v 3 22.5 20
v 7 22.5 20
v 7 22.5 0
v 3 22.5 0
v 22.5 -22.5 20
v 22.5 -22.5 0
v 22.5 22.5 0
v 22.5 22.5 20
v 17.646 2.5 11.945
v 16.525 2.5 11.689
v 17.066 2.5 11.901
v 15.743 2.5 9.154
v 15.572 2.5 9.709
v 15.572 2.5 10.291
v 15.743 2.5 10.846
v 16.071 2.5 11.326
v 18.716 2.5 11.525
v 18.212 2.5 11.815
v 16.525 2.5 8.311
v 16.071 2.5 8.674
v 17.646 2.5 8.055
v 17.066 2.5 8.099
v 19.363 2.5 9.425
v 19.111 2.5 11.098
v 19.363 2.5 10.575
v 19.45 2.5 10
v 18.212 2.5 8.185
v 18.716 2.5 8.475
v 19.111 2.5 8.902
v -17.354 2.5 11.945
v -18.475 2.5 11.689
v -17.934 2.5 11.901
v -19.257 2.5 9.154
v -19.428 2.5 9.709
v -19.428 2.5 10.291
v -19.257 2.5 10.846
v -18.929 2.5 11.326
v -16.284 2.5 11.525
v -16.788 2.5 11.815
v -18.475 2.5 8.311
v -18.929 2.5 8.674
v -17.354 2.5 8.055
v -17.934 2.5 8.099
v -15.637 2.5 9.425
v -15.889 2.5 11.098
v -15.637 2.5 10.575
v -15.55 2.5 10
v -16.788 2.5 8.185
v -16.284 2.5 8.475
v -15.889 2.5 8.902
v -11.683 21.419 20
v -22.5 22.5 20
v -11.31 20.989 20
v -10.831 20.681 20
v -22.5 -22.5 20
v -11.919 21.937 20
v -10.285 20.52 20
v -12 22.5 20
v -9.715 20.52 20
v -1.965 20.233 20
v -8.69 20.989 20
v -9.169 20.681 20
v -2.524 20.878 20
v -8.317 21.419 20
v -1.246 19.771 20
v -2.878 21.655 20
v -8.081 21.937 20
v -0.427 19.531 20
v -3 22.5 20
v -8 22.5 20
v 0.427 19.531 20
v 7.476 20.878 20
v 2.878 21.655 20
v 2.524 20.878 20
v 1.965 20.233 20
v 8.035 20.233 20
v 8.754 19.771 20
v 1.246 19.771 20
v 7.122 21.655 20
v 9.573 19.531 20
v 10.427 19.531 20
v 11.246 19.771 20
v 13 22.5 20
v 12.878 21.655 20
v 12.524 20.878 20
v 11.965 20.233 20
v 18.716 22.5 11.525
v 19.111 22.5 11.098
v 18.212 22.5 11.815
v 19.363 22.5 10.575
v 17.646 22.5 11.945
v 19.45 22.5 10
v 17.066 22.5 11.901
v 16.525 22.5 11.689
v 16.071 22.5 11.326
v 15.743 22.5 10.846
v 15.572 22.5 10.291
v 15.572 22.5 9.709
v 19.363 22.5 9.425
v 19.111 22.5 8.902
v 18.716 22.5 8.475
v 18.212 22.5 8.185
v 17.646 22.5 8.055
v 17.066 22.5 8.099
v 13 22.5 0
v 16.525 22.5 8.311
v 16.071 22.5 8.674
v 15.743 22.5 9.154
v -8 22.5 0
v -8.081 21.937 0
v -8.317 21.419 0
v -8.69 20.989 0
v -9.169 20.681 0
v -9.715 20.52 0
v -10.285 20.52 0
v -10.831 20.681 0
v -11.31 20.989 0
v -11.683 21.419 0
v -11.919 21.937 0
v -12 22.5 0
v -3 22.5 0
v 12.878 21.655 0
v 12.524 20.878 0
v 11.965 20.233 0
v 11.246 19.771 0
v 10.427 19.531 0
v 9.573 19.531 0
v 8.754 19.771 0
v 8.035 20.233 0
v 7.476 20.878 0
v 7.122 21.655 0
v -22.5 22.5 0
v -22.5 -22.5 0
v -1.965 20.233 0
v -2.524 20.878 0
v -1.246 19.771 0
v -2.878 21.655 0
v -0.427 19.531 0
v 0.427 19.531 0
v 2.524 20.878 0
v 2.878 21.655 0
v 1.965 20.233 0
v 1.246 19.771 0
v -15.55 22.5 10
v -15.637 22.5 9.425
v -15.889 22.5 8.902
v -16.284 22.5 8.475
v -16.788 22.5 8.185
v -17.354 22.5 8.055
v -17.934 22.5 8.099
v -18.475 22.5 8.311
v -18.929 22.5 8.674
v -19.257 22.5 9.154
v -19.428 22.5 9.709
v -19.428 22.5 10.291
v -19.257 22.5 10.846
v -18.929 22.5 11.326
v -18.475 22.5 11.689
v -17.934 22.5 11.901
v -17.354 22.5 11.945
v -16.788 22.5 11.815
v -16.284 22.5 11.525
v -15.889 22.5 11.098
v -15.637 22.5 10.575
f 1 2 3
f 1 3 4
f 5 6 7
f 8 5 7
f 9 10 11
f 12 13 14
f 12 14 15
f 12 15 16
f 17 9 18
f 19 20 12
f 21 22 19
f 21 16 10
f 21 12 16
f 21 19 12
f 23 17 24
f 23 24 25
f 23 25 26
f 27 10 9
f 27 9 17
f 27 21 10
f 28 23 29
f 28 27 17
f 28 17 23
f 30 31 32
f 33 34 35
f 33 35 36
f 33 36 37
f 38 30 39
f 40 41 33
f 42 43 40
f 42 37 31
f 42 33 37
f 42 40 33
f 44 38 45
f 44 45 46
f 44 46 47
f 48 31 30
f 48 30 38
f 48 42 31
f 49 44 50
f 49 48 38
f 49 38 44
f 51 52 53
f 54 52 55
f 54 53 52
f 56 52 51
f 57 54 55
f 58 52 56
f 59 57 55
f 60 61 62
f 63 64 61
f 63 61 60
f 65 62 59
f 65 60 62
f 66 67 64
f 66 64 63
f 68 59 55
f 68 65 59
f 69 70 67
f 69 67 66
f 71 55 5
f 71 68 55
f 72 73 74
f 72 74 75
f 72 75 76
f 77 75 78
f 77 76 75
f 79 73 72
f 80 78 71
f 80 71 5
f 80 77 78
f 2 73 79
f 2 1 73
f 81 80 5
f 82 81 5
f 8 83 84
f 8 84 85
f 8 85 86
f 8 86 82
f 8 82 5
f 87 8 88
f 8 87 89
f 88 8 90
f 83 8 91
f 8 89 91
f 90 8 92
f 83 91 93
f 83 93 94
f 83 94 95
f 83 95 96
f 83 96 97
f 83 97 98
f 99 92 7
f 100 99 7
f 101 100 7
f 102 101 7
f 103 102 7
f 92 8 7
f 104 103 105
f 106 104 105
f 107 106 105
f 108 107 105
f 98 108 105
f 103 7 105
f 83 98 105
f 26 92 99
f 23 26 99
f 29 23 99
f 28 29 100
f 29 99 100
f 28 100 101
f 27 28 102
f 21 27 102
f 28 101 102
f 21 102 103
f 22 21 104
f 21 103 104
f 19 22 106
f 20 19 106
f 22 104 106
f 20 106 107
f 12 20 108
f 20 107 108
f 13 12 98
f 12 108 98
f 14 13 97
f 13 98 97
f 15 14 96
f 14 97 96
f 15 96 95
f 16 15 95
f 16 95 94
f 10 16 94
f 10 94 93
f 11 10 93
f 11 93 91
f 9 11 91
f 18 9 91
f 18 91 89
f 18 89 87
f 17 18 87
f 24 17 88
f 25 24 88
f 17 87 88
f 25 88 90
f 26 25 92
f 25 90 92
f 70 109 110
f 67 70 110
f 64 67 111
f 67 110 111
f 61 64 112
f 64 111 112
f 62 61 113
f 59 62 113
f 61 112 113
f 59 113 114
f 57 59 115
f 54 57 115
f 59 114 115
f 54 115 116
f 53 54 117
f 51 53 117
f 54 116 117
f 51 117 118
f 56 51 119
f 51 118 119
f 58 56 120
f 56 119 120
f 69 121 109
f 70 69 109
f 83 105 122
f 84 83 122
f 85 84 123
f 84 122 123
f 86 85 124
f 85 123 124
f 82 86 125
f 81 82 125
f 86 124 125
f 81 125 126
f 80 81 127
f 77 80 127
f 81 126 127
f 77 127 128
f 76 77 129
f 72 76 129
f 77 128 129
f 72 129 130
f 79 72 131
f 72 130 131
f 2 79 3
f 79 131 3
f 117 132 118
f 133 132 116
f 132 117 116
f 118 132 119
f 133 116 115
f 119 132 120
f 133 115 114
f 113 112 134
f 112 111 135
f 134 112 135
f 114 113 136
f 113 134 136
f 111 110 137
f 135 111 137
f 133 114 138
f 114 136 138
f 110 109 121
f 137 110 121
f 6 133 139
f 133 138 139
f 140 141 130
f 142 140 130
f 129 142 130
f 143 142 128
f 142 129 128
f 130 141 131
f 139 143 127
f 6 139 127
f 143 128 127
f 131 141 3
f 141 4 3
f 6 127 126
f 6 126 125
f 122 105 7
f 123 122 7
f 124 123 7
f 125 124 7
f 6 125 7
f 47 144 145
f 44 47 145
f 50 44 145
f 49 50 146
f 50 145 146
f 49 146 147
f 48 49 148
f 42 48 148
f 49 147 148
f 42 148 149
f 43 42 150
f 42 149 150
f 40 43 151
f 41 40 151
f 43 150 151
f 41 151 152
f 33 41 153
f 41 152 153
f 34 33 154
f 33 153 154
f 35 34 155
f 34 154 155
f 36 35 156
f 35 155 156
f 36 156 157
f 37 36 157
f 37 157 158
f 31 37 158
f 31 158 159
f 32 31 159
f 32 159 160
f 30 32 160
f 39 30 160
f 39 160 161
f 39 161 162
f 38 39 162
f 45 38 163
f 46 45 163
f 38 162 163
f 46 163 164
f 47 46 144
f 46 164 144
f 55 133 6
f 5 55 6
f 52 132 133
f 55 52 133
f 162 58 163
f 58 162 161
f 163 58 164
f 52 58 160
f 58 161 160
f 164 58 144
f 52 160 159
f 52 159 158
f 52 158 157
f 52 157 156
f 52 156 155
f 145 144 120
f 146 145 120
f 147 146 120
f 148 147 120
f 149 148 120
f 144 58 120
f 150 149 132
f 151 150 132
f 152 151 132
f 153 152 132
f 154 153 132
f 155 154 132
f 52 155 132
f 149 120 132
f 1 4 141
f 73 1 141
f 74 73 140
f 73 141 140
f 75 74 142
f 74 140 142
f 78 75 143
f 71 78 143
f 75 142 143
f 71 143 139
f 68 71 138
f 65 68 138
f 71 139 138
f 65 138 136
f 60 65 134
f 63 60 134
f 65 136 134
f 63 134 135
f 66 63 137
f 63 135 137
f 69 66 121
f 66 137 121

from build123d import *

# Parameters (mm, degrees)
BOSS_EXTRUDE1_DEPTH = 20
SKETCH2_R           = 1.95
CUT_EXTRUDE1_DEPTH  = 20


with BuildPart() as part:
    # Sketch1 → Boss-Extrude1 (new body)
    with BuildSketch(Plane.XY):
        with BuildLine():
            Line((-22.5, -22.5), (22.5, -22.5))
            Line((22.5, -22.5), (22.5, 22.5))
            Line((22.5, 22.5), (13, 22.5))
            ThreePointArc((13, 22.5), (10, 19.5), (7, 22.5))
            Line((7, 22.5), (3, 22.5))
            ThreePointArc((3, 22.5), (0, 19.5), (-3, 22.5))
            Line((-3, 22.5), (-8, 22.5))
            ThreePointArc((-8, 22.5), (-10, 20.5), (-12, 22.5))
            Line((-12, 22.5), (-22.5, 22.5))
            Line((-22.5, 22.5), (-22.5, -22.5))
        make_face()
    extrude(amount=BOSS_EXTRUDE1_DEPTH)

    # Sketch2 → Cut-Extrude1 (cut)
    with BuildSketch(Plane(origin=(0, 22.5, 0), x_dir=(1, 0, 0), z_dir=(0, 1, 0))):
        with Locations((-17.5, -10)):
            Circle(SKETCH2_R)
        with Locations((17.5, -10)):
            Circle(SKETCH2_R)
    extrude(amount=-CUT_EXTRUDE1_DEPTH, mode=Mode.SUBTRACT)


solid = part.part
